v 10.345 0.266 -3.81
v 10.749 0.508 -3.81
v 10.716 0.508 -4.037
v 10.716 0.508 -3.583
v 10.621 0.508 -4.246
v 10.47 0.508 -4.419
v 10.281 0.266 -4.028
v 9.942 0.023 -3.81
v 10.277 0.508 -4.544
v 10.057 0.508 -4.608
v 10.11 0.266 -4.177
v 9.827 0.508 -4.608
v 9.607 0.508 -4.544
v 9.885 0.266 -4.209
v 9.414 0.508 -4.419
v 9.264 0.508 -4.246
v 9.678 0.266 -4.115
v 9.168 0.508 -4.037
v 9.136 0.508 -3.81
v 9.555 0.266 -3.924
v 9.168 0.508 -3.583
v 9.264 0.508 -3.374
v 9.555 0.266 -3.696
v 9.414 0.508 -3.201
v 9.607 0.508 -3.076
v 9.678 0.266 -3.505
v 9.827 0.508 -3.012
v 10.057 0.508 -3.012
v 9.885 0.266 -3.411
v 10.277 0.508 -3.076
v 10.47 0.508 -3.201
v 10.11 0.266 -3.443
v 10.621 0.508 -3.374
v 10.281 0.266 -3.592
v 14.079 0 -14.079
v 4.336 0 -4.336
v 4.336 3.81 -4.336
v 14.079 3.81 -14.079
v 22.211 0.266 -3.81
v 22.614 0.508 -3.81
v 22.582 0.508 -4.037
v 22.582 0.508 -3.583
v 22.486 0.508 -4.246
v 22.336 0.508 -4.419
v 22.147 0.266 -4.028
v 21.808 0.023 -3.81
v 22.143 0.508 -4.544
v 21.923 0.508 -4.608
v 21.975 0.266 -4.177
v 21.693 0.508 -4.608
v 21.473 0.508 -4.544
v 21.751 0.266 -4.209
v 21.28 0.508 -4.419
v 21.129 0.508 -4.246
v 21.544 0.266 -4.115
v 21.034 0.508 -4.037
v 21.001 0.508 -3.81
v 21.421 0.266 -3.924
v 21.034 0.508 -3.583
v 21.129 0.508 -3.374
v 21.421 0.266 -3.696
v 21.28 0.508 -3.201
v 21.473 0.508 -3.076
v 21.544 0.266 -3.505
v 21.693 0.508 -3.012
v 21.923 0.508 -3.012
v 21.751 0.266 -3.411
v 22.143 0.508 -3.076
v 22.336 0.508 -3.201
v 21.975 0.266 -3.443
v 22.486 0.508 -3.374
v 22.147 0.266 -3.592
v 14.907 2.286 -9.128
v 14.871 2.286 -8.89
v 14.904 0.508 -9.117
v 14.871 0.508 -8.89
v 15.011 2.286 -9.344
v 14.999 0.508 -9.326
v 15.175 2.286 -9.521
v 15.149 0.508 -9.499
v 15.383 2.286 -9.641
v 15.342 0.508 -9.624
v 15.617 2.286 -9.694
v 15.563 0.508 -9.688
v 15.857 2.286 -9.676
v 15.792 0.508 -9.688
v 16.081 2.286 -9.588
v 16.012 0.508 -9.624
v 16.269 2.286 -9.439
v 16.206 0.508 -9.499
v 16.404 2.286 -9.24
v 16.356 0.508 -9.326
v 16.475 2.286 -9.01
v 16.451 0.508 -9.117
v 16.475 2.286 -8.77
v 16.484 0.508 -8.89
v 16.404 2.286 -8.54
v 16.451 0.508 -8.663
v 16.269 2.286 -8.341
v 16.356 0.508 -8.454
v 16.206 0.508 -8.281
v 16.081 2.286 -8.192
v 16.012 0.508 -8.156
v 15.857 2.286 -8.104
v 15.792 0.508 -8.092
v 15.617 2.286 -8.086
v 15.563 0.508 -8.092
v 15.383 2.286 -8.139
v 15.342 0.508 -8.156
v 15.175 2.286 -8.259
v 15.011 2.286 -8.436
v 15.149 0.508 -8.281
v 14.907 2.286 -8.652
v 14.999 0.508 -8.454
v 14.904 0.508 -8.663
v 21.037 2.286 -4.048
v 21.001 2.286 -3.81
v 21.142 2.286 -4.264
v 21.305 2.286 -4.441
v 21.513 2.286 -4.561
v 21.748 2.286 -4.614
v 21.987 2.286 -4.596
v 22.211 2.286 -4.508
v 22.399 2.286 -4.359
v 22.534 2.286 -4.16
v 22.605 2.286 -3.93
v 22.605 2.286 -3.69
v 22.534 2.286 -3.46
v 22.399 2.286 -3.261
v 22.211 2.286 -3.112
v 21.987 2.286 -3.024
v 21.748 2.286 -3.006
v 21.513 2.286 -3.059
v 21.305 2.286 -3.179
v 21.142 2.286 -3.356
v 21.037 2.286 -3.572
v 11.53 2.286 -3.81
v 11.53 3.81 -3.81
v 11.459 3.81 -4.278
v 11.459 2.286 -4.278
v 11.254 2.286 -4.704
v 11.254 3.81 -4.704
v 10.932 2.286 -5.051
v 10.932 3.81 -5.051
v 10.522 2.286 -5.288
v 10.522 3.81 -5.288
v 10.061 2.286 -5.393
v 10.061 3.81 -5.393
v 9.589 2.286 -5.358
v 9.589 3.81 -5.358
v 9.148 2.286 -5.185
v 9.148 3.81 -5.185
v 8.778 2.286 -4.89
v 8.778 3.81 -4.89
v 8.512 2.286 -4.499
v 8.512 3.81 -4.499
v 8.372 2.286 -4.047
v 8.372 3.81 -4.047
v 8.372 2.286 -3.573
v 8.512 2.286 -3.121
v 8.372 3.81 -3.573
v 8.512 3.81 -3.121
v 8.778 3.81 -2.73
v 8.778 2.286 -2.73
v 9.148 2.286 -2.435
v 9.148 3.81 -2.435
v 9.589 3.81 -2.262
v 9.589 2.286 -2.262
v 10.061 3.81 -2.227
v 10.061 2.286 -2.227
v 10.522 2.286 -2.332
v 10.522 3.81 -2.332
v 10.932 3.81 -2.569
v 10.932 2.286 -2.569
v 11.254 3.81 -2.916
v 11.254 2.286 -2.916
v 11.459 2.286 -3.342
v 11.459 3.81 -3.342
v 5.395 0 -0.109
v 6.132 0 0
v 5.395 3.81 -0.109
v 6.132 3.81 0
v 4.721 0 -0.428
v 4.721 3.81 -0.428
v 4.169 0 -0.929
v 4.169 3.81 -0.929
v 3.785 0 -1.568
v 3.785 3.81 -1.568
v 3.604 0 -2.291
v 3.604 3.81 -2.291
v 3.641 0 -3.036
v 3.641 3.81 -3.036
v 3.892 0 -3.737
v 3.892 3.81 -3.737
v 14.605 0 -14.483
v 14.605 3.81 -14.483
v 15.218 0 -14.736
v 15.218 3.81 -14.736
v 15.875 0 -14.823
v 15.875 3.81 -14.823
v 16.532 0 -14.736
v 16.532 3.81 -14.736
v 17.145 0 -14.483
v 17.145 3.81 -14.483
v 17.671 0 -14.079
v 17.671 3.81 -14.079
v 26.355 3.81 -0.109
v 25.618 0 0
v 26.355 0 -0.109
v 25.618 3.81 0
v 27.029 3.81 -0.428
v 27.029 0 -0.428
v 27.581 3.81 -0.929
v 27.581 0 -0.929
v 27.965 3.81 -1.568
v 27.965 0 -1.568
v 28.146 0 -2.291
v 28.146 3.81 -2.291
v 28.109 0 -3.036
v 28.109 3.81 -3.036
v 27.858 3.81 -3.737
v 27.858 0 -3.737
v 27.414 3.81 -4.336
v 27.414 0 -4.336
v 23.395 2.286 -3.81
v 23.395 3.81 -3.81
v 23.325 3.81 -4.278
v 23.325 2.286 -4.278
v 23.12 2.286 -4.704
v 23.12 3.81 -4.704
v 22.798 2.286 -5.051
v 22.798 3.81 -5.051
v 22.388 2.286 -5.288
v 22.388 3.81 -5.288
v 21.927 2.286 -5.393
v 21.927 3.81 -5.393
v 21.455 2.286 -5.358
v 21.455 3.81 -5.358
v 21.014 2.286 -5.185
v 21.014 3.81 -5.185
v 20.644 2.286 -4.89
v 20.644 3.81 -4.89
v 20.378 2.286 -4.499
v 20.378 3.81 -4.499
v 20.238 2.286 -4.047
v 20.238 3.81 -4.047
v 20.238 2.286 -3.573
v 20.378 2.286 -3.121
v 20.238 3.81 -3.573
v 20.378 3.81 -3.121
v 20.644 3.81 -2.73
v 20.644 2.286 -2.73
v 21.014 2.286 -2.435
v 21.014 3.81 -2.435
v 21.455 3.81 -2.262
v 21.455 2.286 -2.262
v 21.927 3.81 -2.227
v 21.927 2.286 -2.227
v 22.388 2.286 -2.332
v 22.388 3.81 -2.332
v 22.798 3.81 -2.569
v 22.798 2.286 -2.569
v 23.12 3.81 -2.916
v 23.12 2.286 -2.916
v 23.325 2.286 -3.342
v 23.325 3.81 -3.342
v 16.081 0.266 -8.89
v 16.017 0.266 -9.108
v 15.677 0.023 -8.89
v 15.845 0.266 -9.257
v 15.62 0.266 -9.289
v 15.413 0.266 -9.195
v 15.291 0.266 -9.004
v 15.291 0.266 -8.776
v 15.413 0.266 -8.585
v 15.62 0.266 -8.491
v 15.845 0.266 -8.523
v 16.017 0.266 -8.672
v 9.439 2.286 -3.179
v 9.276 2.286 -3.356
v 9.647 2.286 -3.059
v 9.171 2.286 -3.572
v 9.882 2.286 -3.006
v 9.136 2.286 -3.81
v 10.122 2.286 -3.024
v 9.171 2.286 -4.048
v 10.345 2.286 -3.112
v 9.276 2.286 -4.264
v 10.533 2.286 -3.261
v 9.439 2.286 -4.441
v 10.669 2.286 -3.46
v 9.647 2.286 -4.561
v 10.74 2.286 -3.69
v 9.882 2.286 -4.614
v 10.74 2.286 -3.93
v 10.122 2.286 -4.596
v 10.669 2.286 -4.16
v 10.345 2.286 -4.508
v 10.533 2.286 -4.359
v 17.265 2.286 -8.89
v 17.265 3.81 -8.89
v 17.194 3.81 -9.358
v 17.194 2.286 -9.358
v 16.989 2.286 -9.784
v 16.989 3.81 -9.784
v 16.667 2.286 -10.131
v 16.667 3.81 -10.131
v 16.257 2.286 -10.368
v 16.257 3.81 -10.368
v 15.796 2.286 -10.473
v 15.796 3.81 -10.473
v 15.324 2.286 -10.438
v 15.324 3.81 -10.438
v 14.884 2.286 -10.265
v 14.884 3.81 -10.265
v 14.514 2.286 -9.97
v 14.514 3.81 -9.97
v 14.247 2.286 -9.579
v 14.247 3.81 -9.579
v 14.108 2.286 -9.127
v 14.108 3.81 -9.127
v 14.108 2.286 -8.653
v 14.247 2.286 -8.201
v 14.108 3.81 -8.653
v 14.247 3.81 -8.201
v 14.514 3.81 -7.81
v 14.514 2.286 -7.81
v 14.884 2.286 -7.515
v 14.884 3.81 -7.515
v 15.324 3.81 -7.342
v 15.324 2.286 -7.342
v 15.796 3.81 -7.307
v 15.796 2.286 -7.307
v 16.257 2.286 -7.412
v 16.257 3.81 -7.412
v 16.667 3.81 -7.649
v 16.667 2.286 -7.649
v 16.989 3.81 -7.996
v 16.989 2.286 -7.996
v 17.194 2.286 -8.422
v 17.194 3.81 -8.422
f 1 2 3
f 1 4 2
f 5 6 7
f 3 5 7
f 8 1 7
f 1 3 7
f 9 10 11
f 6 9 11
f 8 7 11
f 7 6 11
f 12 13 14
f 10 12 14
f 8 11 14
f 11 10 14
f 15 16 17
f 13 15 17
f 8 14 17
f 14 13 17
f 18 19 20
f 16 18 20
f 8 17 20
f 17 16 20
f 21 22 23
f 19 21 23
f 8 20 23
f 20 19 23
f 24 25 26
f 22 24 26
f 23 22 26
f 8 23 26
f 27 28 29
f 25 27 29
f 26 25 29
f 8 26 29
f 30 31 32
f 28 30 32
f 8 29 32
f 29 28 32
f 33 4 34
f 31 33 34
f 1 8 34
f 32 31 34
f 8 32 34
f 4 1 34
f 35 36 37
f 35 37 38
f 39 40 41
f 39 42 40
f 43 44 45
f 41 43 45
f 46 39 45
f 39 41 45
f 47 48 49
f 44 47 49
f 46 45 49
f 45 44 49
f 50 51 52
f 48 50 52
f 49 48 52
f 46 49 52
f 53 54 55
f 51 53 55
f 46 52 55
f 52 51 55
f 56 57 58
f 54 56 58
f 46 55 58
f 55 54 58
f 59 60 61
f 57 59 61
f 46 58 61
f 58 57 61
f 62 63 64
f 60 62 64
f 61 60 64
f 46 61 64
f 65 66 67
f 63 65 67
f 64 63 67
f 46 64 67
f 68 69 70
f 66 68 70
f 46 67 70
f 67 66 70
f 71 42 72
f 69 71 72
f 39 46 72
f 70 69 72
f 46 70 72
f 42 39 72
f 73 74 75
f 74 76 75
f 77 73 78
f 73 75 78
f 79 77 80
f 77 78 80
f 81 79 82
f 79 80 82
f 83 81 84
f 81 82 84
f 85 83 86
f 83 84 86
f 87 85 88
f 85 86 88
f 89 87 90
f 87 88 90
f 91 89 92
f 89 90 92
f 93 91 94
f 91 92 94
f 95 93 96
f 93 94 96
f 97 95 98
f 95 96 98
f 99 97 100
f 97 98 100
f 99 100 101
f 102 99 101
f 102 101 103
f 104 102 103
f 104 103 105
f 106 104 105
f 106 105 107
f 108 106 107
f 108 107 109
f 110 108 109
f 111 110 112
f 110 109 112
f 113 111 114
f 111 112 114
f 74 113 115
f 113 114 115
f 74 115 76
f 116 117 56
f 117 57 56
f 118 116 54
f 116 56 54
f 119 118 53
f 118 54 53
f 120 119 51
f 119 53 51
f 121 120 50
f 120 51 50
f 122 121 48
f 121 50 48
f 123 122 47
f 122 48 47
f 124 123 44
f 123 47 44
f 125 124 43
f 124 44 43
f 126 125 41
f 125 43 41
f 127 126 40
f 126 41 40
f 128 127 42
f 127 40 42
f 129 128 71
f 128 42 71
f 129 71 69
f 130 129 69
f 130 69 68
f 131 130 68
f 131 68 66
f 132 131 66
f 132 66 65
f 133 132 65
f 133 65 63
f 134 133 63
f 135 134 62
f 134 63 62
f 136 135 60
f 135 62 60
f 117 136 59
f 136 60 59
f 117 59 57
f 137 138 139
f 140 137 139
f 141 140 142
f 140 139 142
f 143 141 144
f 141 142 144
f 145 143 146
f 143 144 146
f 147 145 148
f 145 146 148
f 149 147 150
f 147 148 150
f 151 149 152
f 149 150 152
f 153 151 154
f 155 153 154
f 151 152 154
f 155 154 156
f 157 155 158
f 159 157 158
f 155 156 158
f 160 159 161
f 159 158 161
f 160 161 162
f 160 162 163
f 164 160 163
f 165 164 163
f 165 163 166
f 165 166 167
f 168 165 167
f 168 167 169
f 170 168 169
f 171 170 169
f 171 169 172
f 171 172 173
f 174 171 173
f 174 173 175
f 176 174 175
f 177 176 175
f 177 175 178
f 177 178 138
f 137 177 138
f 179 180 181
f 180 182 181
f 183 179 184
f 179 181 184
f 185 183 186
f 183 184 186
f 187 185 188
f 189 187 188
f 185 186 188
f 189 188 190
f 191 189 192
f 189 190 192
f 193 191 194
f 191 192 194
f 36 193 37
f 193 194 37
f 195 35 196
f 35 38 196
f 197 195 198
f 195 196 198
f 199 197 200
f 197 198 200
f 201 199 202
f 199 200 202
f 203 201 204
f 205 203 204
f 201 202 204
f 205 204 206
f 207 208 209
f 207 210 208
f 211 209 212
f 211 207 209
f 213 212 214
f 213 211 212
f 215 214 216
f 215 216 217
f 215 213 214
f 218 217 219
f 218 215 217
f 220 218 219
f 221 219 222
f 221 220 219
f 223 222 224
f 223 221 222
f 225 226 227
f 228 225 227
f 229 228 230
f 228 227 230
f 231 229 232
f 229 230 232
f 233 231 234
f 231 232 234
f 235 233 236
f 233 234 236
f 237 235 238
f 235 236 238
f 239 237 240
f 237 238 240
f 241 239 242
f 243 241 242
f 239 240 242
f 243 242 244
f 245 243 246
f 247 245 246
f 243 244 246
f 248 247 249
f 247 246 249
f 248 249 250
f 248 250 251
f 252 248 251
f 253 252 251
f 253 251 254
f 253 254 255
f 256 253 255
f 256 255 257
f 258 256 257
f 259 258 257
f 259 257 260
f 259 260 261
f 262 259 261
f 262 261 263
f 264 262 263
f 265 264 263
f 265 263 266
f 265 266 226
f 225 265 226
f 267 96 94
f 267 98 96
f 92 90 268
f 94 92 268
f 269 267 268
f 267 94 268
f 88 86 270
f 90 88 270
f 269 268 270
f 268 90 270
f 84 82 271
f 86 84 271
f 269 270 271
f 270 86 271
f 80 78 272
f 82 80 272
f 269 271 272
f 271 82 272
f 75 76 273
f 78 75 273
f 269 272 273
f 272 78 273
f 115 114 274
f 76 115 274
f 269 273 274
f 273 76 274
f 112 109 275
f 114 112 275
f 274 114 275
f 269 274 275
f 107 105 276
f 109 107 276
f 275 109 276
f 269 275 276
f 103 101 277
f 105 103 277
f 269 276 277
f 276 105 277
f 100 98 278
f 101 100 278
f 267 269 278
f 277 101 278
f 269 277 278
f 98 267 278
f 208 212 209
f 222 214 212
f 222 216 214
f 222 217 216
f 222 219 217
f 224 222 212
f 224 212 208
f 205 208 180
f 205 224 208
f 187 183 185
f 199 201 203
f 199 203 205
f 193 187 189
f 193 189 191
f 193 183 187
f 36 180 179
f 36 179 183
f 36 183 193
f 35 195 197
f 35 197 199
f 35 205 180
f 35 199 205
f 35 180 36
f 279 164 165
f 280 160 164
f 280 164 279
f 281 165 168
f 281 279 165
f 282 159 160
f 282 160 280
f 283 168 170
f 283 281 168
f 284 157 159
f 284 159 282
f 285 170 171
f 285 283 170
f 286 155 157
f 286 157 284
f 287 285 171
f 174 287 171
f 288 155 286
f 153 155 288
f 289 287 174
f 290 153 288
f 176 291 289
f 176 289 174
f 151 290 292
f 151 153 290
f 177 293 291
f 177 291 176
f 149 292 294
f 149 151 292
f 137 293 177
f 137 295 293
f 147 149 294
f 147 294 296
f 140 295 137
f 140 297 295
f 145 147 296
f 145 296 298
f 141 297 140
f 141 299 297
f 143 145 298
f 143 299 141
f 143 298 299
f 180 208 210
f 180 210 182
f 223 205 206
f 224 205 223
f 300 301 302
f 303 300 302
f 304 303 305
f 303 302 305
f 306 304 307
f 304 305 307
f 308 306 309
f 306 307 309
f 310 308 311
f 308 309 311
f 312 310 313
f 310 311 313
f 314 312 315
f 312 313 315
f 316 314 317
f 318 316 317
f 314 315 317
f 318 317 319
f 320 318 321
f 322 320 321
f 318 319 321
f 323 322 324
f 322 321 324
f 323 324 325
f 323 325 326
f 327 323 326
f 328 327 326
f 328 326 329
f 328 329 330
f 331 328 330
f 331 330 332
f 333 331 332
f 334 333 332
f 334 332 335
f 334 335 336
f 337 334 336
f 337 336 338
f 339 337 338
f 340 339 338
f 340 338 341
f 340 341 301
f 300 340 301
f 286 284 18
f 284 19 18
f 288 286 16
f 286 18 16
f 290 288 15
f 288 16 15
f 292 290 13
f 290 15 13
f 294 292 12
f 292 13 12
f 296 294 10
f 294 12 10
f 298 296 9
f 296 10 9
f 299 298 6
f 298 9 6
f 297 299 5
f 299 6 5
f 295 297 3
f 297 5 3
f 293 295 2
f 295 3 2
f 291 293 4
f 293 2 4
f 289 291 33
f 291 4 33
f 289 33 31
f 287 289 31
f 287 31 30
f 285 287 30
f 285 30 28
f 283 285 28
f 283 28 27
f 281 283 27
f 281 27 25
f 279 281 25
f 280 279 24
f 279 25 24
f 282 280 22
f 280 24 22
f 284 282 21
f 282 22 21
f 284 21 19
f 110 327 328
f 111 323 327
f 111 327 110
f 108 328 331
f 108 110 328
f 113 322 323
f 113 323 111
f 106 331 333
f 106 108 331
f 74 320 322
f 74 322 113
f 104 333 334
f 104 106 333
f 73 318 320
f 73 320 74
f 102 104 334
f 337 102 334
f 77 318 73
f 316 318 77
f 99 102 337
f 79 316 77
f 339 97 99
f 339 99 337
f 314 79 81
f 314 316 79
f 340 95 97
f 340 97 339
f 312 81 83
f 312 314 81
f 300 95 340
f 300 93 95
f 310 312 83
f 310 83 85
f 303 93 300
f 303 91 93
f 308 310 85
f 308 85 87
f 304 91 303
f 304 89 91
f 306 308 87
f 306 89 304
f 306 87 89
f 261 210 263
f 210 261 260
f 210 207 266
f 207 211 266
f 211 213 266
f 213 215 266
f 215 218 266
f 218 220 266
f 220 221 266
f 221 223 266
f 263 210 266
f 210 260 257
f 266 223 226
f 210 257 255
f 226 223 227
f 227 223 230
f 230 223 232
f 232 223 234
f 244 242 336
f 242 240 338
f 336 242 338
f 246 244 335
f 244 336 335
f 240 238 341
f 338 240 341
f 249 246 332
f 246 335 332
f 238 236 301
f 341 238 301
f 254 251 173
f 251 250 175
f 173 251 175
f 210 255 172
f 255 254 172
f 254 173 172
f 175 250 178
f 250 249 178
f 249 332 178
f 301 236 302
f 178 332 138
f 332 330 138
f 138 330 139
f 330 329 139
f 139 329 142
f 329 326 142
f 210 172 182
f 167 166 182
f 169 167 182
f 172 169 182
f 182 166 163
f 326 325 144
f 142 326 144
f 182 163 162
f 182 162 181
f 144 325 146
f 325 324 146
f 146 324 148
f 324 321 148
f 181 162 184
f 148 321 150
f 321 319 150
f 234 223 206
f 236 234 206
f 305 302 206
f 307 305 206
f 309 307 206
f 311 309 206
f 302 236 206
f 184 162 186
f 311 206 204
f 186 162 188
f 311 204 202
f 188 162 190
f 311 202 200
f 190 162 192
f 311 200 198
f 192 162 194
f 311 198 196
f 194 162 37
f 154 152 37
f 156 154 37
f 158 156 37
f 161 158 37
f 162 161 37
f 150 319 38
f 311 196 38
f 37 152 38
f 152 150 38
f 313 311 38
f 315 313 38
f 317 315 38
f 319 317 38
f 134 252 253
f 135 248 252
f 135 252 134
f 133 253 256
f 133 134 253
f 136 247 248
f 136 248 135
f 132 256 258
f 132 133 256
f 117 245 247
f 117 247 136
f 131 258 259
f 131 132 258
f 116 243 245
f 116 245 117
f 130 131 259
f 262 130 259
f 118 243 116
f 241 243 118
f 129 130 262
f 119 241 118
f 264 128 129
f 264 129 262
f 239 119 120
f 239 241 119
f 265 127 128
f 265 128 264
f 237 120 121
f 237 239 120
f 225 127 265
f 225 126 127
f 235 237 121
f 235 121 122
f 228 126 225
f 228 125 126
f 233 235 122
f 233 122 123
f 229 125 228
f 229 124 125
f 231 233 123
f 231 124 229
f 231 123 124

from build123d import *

# Parameters (mm, degrees)
BOSS_EXTRUDE1_DEPTH                            = 3.81
FILLET1_R                                      = 2.54
CBORE_FOR_0_SOCKET_HEAD_CAP_SCREW1_D           = 1.6129
CBORE_FOR_0_SOCKET_HEAD_CAP_SCREW1_DEPTH       = 3.302
CBORE_FOR_0_SOCKET_HEAD_CAP_SCREW1_CBORE_D     = 3.175
CBORE_FOR_0_SOCKET_HEAD_CAP_SCREW1_CBORE_DEPTH = 1.524
CBORE_FOR_0_SOCKET_HEAD_CAP_SCREW1_TIP         = 0.484564046


with BuildPart() as part:
    # Sketch2 → Boss-Extrude1 (new body)
    with BuildSketch(Plane(origin=(0, 0, 0), x_dir=(1, 0, 0), z_dir=(0, 1, 0))):
        Polygon((31.75, 0), (0, 0), (15.875, 15.875), align=None)
    extrude(amount=BOSS_EXTRUDE1_DEPTH)

    # Fillet1
    fillet1_edges = [part.edges().sort_by_distance(p)[0] for p in [
        (0, 1.905, 0),
        (15.875, 1.905, -15.875),
        (31.75, 1.905, 0),
    ]]
    fillet(fillet1_edges, radius=FILLET1_R)

    # CBORE for #0 Socket Head Cap Screw1
    with Locations(Plane(origin=(0, 3.81, 0), x_dir=(1, 0, 0), z_dir=(0, 1, 0))):
        with Locations((9.942102448, 3.81), (15.677428144, 8.89), (21.807897552, 3.81)):
            CounterBoreHole(CBORE_FOR_0_SOCKET_HEAD_CAP_SCREW1_D / 2, CBORE_FOR_0_SOCKET_HEAD_CAP_SCREW1_CBORE_D / 2, CBORE_FOR_0_SOCKET_HEAD_CAP_SCREW1_CBORE_DEPTH, depth=CBORE_FOR_0_SOCKET_HEAD_CAP_SCREW1_DEPTH)
            with Locations((0, 0, -(CBORE_FOR_0_SOCKET_HEAD_CAP_SCREW1_DEPTH + CBORE_FOR_0_SOCKET_HEAD_CAP_SCREW1_TIP / 2))):  # 118° drill point
                Cone(0, CBORE_FOR_0_SOCKET_HEAD_CAP_SCREW1_D / 2, CBORE_FOR_0_SOCKET_HEAD_CAP_SCREW1_TIP, mode=Mode.SUBTRACT)


solid = part.part
